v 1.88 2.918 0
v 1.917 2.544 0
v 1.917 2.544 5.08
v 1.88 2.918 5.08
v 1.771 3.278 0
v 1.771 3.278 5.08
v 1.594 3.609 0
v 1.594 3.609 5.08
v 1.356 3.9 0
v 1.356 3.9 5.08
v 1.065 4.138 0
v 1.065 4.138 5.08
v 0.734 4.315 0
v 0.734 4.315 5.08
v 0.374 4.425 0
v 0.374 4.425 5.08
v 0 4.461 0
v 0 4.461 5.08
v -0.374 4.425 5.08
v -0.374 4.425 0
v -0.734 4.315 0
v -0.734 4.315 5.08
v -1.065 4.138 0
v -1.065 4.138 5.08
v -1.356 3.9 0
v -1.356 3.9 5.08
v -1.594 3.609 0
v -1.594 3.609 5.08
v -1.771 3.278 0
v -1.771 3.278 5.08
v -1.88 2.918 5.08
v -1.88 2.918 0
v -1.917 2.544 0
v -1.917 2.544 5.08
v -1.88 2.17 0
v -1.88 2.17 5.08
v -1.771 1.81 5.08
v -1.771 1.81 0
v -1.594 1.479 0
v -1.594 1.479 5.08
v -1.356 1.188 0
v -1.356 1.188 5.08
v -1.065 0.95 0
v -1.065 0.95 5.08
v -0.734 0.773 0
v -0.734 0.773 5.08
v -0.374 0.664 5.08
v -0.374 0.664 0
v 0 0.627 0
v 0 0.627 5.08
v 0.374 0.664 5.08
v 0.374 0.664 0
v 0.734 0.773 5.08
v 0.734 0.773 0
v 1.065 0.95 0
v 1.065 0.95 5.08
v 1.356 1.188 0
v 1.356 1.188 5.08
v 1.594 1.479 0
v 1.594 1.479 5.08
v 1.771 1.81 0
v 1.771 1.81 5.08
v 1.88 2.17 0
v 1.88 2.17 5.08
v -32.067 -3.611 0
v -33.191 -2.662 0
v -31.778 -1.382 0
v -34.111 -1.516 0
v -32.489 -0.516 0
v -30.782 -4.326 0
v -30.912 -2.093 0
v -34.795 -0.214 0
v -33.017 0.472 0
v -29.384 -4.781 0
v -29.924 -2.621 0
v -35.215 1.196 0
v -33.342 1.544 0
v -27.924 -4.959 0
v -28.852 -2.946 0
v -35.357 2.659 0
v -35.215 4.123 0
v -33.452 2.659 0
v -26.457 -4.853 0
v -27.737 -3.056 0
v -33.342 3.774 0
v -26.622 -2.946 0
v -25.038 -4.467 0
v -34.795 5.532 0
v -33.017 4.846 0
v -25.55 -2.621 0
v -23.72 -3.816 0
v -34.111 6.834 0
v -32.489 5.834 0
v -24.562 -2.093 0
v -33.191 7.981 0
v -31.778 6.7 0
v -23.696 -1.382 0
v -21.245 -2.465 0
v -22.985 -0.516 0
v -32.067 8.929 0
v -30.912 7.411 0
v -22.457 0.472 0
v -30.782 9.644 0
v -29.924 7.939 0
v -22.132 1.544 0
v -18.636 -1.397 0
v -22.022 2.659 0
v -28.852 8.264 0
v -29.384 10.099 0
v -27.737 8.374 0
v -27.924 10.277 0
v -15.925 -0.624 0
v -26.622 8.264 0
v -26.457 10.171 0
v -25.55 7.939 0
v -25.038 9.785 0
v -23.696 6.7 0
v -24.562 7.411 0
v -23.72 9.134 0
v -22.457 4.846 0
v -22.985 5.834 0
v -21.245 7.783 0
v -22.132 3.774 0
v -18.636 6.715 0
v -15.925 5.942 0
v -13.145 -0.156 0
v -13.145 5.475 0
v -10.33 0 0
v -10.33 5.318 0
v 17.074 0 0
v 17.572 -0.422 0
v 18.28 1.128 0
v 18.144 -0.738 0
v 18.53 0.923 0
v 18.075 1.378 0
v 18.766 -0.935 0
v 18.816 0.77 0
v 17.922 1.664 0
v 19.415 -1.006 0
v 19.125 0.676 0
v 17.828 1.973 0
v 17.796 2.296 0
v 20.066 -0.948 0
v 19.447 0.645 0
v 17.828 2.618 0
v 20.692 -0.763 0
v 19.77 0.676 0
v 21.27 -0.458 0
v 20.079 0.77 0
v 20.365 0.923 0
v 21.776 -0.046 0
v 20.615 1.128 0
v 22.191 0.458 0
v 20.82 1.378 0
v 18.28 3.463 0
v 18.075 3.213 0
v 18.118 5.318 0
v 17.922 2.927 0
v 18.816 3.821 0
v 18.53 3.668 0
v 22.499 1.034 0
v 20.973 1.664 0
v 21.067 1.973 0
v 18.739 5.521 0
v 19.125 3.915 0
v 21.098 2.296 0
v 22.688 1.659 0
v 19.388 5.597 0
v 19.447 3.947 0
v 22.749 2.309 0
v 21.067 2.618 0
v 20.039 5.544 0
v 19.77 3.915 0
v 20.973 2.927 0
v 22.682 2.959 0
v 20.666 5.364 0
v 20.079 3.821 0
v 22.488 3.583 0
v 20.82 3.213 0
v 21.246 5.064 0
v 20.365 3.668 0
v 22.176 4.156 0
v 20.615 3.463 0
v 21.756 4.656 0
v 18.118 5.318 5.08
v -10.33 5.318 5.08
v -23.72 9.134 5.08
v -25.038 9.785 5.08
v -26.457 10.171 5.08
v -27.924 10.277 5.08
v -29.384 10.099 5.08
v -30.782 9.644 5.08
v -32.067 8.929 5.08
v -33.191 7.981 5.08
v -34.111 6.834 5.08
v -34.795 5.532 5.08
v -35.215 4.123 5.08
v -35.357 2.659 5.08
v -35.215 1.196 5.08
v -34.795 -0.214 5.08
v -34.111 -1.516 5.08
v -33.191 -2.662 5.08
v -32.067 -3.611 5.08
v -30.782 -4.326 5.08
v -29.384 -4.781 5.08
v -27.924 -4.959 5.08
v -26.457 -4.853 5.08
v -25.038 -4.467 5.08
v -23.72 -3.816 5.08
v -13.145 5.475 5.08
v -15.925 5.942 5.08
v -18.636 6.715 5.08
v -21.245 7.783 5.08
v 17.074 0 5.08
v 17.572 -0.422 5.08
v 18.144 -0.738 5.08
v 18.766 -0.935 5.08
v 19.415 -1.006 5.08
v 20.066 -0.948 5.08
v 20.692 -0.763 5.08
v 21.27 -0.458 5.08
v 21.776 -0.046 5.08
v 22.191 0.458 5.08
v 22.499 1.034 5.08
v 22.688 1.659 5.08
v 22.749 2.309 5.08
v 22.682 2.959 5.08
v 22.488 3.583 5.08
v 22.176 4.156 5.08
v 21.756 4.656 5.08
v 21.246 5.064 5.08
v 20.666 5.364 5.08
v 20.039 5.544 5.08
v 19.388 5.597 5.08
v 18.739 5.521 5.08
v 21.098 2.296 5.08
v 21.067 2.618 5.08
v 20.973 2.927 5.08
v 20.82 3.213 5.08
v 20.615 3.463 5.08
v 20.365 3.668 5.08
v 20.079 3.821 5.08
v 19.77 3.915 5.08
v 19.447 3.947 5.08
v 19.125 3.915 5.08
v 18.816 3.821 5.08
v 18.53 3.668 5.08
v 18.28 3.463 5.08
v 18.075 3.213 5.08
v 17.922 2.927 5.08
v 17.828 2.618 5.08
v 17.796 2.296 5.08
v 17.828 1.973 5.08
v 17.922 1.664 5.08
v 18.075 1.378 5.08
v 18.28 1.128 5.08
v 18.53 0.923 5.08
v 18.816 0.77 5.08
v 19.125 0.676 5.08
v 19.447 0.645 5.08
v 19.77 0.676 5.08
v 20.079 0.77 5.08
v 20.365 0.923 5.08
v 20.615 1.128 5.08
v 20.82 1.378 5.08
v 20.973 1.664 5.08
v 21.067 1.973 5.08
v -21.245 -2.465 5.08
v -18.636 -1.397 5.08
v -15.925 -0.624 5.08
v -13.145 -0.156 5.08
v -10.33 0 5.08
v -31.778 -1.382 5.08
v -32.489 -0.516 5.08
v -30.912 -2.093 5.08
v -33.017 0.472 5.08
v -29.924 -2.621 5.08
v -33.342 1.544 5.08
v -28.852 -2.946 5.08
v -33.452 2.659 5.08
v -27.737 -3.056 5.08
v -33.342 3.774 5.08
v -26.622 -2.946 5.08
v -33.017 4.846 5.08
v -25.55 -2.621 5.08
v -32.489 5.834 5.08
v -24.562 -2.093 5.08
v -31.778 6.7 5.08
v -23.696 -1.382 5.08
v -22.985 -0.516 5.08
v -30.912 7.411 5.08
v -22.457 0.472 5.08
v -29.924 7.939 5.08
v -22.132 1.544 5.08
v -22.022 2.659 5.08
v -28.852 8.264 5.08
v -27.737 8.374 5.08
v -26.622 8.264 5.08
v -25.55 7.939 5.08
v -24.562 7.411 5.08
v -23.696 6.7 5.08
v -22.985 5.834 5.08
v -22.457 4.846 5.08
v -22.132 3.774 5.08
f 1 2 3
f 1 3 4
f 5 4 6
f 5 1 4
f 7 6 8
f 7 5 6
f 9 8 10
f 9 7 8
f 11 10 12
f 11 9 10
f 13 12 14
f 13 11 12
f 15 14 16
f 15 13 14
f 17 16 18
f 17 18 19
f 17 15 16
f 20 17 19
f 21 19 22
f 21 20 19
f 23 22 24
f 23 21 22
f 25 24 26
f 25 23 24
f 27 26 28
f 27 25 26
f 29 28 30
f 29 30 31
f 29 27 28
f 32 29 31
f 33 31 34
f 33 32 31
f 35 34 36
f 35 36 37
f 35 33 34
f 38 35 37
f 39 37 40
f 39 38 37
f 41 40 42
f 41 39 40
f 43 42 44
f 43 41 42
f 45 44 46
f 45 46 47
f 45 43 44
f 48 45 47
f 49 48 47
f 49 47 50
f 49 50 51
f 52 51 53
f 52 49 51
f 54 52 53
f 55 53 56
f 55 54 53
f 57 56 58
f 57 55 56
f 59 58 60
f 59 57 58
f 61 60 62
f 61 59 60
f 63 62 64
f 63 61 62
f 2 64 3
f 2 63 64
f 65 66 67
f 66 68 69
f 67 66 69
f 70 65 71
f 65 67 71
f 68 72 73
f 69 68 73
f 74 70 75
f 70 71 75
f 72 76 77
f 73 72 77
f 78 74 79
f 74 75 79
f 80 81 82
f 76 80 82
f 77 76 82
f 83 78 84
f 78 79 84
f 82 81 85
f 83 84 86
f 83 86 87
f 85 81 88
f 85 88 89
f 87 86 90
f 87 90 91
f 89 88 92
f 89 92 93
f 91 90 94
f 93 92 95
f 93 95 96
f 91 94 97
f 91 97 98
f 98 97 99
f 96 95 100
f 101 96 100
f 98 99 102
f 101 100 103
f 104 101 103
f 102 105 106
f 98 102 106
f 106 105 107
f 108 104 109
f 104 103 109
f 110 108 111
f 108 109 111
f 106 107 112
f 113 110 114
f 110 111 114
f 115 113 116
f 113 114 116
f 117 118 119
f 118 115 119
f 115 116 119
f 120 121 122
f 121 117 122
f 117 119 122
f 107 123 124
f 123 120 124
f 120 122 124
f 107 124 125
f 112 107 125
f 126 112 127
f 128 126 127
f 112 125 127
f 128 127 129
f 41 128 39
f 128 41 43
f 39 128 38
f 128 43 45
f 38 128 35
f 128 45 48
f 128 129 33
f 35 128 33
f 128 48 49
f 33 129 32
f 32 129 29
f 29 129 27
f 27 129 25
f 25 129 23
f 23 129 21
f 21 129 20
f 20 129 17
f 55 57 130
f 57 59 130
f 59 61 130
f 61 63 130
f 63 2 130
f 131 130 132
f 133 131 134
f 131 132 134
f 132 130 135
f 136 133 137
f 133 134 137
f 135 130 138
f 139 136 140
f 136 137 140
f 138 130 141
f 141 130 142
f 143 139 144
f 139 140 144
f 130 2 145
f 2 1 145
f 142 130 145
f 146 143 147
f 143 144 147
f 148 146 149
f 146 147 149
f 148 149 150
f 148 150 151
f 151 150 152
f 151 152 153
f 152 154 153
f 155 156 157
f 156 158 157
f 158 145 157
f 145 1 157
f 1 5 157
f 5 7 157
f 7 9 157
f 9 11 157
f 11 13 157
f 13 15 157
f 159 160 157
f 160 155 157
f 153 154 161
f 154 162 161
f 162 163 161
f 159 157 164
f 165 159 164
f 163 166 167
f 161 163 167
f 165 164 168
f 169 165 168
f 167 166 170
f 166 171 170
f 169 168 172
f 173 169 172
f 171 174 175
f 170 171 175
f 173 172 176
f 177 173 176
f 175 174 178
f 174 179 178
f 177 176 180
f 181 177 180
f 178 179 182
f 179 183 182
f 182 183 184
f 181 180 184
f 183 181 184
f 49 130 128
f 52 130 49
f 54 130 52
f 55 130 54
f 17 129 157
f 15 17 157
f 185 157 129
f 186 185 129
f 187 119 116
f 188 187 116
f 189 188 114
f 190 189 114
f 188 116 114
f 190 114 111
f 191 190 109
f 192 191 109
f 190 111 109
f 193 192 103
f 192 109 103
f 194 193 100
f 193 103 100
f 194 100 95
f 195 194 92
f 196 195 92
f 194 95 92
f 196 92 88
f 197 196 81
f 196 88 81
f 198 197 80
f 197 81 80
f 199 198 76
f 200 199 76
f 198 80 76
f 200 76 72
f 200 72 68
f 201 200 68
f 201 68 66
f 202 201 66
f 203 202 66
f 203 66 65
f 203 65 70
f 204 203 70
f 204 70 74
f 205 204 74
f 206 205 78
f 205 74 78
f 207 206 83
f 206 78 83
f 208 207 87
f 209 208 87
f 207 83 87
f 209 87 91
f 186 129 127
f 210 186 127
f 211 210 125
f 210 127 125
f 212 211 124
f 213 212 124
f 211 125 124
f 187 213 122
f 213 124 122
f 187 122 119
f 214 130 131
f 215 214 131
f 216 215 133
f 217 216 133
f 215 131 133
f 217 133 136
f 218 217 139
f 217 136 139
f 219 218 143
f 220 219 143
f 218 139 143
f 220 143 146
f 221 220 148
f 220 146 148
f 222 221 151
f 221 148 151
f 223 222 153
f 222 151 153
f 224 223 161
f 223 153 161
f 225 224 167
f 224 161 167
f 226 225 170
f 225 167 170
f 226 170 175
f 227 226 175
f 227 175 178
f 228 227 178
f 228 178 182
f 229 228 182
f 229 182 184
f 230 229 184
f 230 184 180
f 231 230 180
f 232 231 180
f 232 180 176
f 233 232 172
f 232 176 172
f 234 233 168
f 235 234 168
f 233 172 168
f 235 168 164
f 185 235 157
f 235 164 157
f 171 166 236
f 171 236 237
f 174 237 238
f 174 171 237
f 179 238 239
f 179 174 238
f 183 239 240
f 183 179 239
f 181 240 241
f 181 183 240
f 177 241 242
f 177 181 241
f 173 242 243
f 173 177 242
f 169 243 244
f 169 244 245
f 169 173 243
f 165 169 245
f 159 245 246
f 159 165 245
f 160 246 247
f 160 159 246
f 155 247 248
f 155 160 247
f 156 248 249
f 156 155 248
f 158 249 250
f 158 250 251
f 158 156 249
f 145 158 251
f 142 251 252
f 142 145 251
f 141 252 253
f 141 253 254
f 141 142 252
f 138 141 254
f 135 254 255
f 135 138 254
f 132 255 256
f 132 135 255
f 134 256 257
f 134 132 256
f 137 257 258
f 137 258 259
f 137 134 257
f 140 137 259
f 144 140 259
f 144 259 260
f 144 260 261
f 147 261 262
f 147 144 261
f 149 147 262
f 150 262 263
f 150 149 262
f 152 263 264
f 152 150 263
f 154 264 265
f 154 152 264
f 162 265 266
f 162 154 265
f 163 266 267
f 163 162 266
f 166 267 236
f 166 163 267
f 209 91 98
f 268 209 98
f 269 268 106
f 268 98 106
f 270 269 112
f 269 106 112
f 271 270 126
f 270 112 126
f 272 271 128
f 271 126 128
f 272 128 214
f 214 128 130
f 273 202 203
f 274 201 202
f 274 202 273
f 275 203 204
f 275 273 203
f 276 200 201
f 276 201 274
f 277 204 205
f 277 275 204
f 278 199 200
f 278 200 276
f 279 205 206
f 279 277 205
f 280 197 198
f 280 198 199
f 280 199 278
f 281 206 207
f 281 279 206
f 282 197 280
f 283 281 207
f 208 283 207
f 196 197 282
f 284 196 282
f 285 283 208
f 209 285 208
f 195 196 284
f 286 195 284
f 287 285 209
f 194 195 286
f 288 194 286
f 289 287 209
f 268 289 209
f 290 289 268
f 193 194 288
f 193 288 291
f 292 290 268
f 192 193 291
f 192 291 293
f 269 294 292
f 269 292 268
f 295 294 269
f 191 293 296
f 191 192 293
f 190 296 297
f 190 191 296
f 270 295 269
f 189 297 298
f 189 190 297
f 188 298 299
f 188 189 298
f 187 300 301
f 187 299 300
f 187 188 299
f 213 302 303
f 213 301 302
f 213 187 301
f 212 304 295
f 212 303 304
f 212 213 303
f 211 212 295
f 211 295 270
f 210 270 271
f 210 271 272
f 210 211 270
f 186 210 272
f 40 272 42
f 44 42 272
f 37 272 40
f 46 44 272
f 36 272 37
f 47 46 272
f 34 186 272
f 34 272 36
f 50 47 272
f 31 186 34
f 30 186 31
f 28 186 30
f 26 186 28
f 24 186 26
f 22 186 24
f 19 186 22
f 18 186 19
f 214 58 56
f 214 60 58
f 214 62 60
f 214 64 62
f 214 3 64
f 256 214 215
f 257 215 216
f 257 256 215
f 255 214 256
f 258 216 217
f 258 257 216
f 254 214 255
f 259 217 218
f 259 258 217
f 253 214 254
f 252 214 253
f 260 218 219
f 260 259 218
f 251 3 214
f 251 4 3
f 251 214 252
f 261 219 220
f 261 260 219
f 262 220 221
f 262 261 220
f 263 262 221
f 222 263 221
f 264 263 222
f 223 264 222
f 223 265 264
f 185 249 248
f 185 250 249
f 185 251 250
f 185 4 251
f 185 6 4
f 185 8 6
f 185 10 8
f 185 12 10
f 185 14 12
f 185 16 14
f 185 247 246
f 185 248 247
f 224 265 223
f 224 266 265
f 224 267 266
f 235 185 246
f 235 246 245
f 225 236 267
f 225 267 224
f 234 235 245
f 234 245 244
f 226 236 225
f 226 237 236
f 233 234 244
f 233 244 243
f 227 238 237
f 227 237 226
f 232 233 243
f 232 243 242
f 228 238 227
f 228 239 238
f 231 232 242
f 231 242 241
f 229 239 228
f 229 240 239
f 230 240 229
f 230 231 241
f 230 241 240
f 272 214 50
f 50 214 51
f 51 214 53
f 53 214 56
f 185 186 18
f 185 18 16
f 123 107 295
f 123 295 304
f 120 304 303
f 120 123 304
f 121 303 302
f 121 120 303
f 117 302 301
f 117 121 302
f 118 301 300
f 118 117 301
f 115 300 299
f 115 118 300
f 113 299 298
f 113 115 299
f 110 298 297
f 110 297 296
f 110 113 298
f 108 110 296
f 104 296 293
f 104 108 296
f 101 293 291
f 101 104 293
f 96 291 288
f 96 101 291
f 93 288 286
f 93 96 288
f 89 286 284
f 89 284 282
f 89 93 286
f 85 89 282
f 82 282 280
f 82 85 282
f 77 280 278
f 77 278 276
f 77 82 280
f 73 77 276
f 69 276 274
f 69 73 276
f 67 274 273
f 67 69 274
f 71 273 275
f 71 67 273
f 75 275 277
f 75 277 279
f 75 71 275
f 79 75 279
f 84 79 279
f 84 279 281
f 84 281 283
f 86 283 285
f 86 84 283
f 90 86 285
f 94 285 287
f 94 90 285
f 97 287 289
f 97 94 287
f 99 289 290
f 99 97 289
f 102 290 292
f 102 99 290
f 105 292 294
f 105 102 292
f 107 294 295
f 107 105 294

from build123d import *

# Parameters (mm, degrees)
F0_R     = 1.917254
F0_R_2   = 1.651
F0_R_3   = 5.715
F1_DEPTH = 5.08


with BuildPart() as f1:
    # F0 (on Top) → F1 (new body)
    with BuildSketch(Plane.XY):
        with BuildLine():
            ThreePointArc((-23.719894, -3.816054), (-17.291451, -0.972636), (-10.32985, 0))
            Line((-10.32985, 0), (17.073956, 0))
            ThreePointArc((17.073956, 0), (22.687581, 1.659287), (18.118341, 5.318259))
            Line((18.118341, 5.318259), (-10.32985, 5.318259))
            ThreePointArc((-10.32985, 5.318259), (-17.291451, 6.290895), (-23.719894, 9.134313))
            ThreePointArc((-23.719894, 9.134313), (-35.356908, 2.659129), (-23.719894, -3.816054))
        make_face()
        with Locations((0, 2.544119)):
            Circle(F0_R, mode=Mode.SUBTRACT)
        with Locations((19.447466, 2.295572)):
            Circle(F0_R_2, mode=Mode.SUBTRACT)
        with Locations((-27.736908, 2.659129)):
            Circle(F0_R_3, mode=Mode.SUBTRACT)
    extrude(amount=F1_DEPTH)


solid = f1.part
